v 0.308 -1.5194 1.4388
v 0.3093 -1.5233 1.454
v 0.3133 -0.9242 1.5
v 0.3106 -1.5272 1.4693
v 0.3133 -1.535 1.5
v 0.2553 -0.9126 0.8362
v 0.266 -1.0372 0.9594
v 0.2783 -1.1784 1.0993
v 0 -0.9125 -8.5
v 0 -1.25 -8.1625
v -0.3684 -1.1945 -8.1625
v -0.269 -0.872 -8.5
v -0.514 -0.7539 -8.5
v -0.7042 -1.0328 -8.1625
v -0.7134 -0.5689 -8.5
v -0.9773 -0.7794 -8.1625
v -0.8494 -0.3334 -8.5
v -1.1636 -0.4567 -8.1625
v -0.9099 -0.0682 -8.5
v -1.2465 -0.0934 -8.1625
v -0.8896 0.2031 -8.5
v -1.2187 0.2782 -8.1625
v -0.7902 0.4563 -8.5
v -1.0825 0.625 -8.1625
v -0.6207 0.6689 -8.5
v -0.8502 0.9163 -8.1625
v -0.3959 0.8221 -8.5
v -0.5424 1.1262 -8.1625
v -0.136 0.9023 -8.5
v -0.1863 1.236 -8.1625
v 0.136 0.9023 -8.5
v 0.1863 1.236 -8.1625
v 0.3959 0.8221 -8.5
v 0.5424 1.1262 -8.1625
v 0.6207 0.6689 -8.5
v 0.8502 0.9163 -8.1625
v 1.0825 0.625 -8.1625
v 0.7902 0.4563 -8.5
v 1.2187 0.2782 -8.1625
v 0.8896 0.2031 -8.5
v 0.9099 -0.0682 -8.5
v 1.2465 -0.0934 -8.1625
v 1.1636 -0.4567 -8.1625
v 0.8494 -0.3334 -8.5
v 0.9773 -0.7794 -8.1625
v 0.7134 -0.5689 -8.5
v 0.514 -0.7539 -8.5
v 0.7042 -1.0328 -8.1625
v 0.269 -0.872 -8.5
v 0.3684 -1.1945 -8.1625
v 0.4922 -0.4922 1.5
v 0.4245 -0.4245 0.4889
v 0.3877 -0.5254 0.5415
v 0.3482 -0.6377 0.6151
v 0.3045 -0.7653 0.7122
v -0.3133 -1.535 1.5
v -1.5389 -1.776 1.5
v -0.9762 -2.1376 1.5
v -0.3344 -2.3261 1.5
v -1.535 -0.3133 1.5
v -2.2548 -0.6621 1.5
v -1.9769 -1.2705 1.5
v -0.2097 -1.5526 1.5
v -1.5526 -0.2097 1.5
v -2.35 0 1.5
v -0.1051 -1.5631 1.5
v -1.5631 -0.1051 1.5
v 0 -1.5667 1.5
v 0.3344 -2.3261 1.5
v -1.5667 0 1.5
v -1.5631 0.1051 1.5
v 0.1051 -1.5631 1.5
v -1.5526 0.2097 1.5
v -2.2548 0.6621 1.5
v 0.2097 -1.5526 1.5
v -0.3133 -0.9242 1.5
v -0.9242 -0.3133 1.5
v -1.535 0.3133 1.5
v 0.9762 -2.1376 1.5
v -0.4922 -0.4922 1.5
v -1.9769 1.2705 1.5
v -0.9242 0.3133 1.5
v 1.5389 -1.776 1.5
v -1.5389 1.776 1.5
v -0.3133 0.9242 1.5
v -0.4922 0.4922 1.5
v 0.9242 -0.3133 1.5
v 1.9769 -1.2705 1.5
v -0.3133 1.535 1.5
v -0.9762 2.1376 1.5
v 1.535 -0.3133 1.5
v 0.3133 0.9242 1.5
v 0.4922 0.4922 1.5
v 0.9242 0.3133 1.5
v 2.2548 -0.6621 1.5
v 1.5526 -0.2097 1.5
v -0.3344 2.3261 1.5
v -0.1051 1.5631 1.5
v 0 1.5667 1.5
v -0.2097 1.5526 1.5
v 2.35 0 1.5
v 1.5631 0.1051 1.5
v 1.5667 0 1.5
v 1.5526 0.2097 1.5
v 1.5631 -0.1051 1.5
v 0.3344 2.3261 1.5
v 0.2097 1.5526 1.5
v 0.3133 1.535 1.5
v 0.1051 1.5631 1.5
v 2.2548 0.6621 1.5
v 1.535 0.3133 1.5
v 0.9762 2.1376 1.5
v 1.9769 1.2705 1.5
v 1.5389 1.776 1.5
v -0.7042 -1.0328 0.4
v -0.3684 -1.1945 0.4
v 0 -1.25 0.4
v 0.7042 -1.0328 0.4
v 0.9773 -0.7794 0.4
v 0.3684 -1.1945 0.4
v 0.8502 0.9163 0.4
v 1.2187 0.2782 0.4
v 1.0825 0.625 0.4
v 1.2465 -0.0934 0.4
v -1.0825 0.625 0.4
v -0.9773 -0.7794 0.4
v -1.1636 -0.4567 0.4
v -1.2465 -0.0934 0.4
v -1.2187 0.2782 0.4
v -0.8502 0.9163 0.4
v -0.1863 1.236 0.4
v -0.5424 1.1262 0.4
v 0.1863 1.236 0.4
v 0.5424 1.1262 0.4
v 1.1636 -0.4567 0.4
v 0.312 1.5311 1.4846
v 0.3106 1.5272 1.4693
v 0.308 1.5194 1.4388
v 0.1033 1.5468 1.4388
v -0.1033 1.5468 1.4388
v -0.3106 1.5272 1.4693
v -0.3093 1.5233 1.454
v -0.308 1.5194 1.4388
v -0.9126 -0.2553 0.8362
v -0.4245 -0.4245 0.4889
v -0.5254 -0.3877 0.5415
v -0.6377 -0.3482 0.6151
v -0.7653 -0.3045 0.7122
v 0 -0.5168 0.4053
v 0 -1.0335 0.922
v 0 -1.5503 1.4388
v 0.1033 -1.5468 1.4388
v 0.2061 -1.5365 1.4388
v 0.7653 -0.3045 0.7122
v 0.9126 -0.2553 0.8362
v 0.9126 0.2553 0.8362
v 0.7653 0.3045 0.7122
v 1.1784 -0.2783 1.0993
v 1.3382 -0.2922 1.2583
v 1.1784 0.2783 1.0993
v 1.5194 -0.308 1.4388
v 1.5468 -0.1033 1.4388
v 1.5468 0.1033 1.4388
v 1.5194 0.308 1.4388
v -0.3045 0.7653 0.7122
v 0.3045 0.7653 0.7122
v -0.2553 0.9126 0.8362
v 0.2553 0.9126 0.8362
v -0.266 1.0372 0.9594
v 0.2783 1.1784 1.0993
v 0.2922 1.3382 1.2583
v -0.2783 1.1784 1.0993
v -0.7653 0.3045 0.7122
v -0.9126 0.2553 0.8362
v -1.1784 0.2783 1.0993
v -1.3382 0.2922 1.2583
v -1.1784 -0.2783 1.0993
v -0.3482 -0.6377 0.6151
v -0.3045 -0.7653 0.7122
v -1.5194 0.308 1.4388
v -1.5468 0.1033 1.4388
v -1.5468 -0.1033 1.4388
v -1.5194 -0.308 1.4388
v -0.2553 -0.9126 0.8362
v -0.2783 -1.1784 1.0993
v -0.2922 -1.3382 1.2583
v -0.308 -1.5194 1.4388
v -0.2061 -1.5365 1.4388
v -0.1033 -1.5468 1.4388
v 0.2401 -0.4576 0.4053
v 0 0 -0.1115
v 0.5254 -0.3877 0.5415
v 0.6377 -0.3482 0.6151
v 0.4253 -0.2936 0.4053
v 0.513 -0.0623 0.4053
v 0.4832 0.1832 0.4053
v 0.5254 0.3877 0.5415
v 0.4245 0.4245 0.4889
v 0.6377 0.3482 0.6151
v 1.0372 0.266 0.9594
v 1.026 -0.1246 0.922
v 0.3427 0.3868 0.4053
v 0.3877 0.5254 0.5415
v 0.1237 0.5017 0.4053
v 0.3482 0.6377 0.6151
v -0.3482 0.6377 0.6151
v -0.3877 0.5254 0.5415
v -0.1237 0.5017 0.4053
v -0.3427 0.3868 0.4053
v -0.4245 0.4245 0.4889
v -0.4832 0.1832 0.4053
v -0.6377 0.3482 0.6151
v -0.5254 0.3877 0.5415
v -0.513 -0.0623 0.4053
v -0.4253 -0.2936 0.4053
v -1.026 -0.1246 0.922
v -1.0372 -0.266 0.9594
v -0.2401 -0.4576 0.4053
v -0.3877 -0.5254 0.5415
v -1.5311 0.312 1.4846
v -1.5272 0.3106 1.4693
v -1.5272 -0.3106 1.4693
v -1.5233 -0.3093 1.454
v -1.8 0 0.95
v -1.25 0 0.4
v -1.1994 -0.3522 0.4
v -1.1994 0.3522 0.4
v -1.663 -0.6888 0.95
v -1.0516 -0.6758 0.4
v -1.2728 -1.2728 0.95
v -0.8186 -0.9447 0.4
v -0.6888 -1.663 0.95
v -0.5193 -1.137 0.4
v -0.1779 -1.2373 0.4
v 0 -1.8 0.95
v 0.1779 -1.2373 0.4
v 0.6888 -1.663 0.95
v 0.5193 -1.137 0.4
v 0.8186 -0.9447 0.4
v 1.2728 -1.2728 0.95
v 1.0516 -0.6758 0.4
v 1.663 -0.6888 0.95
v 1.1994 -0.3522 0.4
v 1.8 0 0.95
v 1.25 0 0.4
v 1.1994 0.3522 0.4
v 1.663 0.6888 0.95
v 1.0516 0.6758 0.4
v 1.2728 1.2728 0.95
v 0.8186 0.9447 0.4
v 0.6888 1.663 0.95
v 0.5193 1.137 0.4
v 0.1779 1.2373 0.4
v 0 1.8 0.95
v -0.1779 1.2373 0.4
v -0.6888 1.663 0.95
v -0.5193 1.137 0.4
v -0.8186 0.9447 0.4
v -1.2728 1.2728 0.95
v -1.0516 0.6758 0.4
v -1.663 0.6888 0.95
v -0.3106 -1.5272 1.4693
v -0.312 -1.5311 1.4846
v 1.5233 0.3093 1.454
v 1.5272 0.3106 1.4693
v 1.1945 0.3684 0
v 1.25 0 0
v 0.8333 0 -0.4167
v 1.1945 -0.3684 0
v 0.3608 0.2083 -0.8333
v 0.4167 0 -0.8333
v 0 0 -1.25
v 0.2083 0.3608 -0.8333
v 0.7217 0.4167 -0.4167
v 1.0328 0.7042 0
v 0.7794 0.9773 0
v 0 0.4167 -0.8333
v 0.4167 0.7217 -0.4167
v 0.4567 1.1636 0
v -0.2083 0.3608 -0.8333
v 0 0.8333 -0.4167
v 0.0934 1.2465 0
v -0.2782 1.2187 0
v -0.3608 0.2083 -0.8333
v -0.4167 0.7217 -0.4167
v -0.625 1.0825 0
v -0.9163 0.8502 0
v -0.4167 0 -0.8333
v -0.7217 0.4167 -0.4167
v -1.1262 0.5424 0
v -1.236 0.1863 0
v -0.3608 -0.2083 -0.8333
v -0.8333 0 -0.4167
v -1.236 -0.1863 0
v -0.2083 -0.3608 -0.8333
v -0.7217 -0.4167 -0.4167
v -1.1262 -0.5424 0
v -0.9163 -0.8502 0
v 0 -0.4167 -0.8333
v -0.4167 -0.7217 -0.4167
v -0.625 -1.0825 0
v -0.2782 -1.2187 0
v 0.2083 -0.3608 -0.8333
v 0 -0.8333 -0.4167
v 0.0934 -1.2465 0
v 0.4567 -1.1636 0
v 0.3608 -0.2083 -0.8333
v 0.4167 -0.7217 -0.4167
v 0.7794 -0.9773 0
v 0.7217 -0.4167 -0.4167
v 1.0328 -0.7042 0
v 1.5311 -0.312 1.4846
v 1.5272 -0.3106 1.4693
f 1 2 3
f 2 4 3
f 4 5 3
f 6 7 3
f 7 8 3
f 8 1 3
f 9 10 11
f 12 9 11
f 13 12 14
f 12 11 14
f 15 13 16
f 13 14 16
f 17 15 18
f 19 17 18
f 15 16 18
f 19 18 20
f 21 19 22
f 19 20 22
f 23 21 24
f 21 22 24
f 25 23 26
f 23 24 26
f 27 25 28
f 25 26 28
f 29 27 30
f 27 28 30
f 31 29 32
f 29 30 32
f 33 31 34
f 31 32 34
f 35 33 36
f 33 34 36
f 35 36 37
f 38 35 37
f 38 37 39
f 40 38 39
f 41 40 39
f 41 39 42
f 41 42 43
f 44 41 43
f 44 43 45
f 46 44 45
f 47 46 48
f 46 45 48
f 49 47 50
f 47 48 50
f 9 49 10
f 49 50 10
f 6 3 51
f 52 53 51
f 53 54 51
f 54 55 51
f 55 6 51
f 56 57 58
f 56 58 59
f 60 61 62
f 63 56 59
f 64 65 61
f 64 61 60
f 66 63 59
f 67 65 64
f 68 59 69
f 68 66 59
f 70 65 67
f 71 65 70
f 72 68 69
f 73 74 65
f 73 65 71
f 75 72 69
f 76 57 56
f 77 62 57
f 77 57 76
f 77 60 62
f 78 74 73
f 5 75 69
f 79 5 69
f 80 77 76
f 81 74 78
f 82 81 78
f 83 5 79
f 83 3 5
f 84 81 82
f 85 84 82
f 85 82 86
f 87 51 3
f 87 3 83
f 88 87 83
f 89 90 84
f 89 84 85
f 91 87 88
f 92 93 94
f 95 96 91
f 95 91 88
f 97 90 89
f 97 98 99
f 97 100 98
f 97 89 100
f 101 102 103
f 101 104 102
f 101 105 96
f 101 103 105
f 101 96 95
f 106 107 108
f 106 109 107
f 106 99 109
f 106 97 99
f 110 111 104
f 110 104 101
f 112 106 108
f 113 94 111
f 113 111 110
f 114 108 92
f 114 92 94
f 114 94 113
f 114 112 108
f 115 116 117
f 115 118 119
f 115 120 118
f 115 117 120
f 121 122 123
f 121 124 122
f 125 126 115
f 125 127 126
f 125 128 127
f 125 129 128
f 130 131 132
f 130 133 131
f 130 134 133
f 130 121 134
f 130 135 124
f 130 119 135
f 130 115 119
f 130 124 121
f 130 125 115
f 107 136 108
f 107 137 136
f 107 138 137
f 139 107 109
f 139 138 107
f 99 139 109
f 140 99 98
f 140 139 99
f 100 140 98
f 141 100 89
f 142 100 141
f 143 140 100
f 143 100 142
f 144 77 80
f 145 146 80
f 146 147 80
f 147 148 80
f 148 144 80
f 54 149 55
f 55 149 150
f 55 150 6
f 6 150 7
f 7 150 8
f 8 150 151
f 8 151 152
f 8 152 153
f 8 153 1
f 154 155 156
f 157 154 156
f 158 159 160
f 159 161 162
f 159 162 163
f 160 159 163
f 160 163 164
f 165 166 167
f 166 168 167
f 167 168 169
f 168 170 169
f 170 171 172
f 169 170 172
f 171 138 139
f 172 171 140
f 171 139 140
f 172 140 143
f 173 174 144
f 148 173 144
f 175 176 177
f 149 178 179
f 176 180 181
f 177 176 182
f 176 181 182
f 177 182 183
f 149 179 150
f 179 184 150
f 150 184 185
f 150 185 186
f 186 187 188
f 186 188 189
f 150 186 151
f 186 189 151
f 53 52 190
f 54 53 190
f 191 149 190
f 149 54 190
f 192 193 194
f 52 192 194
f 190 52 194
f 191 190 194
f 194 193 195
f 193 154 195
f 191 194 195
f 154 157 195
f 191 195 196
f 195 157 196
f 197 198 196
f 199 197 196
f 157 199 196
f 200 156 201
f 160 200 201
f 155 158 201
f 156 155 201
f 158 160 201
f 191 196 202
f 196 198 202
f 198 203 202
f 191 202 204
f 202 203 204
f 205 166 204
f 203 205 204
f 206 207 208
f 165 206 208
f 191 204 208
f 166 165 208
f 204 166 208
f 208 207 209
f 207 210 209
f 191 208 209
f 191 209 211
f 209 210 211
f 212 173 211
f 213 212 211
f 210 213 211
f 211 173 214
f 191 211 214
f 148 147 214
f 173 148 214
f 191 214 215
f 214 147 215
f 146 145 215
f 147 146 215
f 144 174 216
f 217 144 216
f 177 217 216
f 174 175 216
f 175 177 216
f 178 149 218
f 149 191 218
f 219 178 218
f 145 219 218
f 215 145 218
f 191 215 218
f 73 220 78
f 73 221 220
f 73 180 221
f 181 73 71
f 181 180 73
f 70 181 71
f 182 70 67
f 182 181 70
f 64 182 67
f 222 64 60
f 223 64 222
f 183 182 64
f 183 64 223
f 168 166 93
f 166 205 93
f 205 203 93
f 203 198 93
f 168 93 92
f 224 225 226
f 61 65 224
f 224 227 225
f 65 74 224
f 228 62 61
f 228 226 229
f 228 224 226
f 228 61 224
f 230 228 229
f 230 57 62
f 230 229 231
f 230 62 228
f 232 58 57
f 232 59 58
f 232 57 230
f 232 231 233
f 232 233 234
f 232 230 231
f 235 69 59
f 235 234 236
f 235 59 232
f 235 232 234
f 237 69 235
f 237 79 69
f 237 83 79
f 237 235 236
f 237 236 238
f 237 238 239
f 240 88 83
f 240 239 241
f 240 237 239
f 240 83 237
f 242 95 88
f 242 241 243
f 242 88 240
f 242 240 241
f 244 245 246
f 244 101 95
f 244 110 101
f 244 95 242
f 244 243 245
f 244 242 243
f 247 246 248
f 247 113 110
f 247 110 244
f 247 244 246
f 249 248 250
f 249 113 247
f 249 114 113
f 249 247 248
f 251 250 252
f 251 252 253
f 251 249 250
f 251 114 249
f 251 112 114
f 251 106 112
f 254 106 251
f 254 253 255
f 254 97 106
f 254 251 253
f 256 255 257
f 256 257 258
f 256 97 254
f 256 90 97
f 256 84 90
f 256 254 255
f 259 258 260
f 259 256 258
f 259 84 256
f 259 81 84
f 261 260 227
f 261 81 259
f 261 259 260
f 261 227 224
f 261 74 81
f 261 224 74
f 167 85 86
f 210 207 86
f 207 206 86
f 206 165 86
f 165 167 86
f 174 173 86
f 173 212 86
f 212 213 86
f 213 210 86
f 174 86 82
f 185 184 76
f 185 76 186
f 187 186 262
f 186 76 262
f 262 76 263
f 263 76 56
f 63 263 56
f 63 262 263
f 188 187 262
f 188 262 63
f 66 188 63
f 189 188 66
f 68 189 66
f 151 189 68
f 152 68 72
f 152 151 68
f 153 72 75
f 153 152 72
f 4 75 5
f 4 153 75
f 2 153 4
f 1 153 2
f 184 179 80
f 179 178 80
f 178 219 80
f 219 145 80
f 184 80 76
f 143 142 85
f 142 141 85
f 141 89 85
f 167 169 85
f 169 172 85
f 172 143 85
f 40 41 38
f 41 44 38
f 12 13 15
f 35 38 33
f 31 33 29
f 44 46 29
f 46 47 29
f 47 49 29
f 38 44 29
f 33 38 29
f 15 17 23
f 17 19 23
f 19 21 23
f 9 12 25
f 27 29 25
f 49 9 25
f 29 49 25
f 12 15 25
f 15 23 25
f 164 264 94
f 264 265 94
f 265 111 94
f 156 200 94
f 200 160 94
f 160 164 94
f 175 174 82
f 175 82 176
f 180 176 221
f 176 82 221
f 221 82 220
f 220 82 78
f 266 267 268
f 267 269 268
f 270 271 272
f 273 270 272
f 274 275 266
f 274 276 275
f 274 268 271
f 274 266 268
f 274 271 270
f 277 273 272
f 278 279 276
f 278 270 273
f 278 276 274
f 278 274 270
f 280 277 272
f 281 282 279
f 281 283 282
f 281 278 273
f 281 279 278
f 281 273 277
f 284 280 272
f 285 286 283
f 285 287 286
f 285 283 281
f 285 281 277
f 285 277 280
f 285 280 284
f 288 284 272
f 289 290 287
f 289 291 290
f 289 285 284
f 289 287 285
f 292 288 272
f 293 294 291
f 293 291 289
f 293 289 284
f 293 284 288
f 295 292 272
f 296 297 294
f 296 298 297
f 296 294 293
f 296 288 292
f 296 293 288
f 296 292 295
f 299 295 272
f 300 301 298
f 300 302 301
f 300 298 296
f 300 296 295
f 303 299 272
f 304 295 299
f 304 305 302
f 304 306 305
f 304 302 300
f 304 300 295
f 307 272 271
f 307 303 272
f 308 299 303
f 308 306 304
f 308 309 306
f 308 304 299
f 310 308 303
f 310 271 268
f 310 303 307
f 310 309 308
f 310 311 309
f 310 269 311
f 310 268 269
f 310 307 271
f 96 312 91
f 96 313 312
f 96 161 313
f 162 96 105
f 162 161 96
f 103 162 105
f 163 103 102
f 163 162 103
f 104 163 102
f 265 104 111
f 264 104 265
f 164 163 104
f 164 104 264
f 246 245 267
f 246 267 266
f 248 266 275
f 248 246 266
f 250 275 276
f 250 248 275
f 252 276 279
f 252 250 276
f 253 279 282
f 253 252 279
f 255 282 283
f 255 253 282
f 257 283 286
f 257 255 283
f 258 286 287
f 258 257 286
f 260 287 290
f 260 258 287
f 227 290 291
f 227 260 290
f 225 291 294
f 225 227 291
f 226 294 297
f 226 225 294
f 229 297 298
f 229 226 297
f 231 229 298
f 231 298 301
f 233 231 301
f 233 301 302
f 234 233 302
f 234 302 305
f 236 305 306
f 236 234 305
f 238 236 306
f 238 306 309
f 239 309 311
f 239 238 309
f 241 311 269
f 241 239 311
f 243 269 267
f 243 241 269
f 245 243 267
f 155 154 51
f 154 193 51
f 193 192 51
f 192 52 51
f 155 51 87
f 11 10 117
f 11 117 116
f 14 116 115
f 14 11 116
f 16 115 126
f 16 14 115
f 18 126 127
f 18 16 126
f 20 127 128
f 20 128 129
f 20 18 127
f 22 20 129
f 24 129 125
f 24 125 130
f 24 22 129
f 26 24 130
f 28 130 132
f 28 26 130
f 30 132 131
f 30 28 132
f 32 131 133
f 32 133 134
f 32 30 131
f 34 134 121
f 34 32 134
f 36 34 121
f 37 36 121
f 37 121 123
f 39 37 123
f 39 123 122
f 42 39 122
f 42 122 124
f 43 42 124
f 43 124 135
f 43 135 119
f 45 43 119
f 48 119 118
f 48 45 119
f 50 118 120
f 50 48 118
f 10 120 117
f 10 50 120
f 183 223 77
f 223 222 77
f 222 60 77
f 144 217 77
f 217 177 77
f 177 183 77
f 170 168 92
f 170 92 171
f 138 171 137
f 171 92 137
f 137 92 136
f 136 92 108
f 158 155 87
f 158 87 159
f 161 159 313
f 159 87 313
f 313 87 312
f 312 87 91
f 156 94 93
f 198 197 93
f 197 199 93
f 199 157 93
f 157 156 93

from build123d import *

# Parameters (mm, degrees)
SKETCH1_R          = 2.35
EXTRUDE3_DEPTH     = 1.5
SKETCH4_W          = 8.9
SKETCH4_H          = 1.25
CHAMFER1_SIZE      = 0.3375
CUT_EXTRUDE3_REACH = 12.538
CIRPATTERN1_COUNT  = 4
DRAFT2_ANGLE       = 5


# Read off the part's stored shape, not the designer's step: Extrude10, Draft1
with BuildPart() as part:
    # Sketch1 → Extrude3 (new body)
    with BuildSketch(Plane.XY):
        Circle(SKETCH1_R)
    extrude(amount=EXTRUDE3_DEPTH)

    # Sketch11 → Cut-Revolve3 (revolve, cut)
    with BuildSketch(Plane(origin=(0, 0, 0), x_dir=(0, 0, -1), z_dir=(1, 0, 0)), mode=Mode.PRIVATE) as cut_revolve3_sk:
        Polygon((0, 0.85), (-1.5, 2.35), (0, 2.35), align=None)
    revolve(cut_revolve3_sk.sketch.rotate(Axis((0, 0, -0.441444004), (0, 0, 1)), 90), axis=Axis((0, 0, -0.441444004), (0, 0, 1)), mode=Mode.SUBTRACT)

    # Extrude10 outline → Extrude10 (revolve)
    with BuildSketch(Plane.XZ):
        Polygon((1.25, 0), (1.25, 0.4), (0.85, 0.4), (0.85, 0), (0, 0), (0, -1.25), align=None)
    revolve(axis=Axis((0, 0, 0), (0, 0, 1)))

    # Cut-Extrude3: up to this cone (the profile starts inside it)
    cut_extrude3_end = Plane(origin=(0, 0, 1.5), z_dir=(0, 0, 1)).offset(-1.611465251) * Cone(1e-06, 16.260932502, 16.260931502, align=(Align.CENTER, Align.CENTER, Align.MIN), mode=Mode.PRIVATE)
    # Sketch12 → Cut-Extrude3 (cut, up to the surface)
    with BuildSketch(Plane.XY.offset(1.5), mode=Mode.PRIVATE) as cut_extrude3_sk1:
        with BuildLine():
            Line((1.535013572, 0.313333333), (0.924173453, 0.313333333))
            Line((0.924173453, 0.313333333), (0.492244262, 0.492244262))
            Line((0.492244262, 0.492244262), (0.313333333, 0.924173453))
            Line((0.313333333, 0.924173453), (0.313333333, 1.535013572))
            ThreePointArc((0.313333333, 1.535013572), (0.15746404, 1.558733306), (0, 1.566666667))
            Line((0, 1.566666667), (0, 0))
            Line((0, 0), (1.566666667, 0))
            ThreePointArc((1.566666667, 0), (1.558733306, 0.15746404), (1.535013572, 0.313333333))
        make_face()
    cut_extrude3_tool1 = extrude(cut_extrude3_sk1.sketch, amount=-CUT_EXTRUDE3_REACH, mode=Mode.PRIVATE) & cut_extrude3_end
    cut_extrude3 = cut_extrude3_tool1.solids().sort_by_distance((1.229594, 0.291177, 1.5))[0]
    add(cut_extrude3, mode=Mode.SUBTRACT)

    # CirPattern1: Cut-Extrude3 ×4 about axis
    cirpattern1_axis = Axis((0, 0, 0), (0, 0, 1))
    for i in range(1, CIRPATTERN1_COUNT):
        add(cut_extrude3.rotate(cirpattern1_axis, i * 360 / CIRPATTERN1_COUNT), mode=Mode.SUBTRACT)

    # Draft1 outline → Draft1 (revolve)
    with BuildSketch(Plane.XZ):
        Polygon((1.566666667, 1.5), (1.550268881, 1.43880263), (1.566666667, 1.43880263), align=None)
    revolve(axis=Axis((0, 0, 0), (0, 0, 1)))

    # Draft2
    draft2_faces = [part.faces().sort_by_distance(p)[0] for p in [
        (0.313333333, 1.140840621, 1.286158691),
        (0.408124508, 0.695327313, 1.100915441),
        (0.695327313, 0.408124508, 1.100915441),
        (1.140840621, 0.313333333, 1.286158691),
        (1.140840621, -0.313333333, 1.286158691),
        (0.695327313, -0.408124508, 1.100915441),
        (0.408124508, -0.695327313, 1.100915441),
        (0.313333333, -1.140840621, 1.286158691),
        (-0.313333333, -1.140840621, 1.286158691),
        (-0.408124508, -0.695327313, 1.100915441),
        (-0.695327313, -0.408124508, 1.100915441),
        (-1.140840621, -0.313333333, 1.286158691),
        (-1.140840621, 0.313333333, 1.286158691),
        (-0.695327313, 0.408124508, 1.100915441),
        (-0.408124508, 0.695327313, 1.100915441),
        (-0.313333333, 1.140840621, 1.286158691),
    ]]
    draft(draft2_faces, Plane.XY.offset(1.5), DRAFT2_ANGLE)


with BuildPart() as body_2:
    # Sketch4 → Revolve1 (revolve)
    with BuildSketch(Plane(origin=(0, 0, 0), x_dir=(0, 0, -1), z_dir=(1, 0, 0)), mode=Mode.PRIVATE) as revolve1_sk:
        with Locations((4.05, 0.625)):
            Rectangle(SKETCH4_W, SKETCH4_H)
    revolve(revolve1_sk.sketch.rotate(Axis((0, 0, 0.4), (0, 0, -1)), 180), axis=Axis((0, 0, 0.4), (0, 0, -1)))

    # Chamfer1
    chamfer1_edges = [body_2.edges().sort_by_distance(p)[0] for p in [
        (0, 1.25, -8.5),
    ]]
    chamfer(chamfer1_edges, length=CHAMFER1_SIZE)


solid = Compound([part.part, body_2.part])
